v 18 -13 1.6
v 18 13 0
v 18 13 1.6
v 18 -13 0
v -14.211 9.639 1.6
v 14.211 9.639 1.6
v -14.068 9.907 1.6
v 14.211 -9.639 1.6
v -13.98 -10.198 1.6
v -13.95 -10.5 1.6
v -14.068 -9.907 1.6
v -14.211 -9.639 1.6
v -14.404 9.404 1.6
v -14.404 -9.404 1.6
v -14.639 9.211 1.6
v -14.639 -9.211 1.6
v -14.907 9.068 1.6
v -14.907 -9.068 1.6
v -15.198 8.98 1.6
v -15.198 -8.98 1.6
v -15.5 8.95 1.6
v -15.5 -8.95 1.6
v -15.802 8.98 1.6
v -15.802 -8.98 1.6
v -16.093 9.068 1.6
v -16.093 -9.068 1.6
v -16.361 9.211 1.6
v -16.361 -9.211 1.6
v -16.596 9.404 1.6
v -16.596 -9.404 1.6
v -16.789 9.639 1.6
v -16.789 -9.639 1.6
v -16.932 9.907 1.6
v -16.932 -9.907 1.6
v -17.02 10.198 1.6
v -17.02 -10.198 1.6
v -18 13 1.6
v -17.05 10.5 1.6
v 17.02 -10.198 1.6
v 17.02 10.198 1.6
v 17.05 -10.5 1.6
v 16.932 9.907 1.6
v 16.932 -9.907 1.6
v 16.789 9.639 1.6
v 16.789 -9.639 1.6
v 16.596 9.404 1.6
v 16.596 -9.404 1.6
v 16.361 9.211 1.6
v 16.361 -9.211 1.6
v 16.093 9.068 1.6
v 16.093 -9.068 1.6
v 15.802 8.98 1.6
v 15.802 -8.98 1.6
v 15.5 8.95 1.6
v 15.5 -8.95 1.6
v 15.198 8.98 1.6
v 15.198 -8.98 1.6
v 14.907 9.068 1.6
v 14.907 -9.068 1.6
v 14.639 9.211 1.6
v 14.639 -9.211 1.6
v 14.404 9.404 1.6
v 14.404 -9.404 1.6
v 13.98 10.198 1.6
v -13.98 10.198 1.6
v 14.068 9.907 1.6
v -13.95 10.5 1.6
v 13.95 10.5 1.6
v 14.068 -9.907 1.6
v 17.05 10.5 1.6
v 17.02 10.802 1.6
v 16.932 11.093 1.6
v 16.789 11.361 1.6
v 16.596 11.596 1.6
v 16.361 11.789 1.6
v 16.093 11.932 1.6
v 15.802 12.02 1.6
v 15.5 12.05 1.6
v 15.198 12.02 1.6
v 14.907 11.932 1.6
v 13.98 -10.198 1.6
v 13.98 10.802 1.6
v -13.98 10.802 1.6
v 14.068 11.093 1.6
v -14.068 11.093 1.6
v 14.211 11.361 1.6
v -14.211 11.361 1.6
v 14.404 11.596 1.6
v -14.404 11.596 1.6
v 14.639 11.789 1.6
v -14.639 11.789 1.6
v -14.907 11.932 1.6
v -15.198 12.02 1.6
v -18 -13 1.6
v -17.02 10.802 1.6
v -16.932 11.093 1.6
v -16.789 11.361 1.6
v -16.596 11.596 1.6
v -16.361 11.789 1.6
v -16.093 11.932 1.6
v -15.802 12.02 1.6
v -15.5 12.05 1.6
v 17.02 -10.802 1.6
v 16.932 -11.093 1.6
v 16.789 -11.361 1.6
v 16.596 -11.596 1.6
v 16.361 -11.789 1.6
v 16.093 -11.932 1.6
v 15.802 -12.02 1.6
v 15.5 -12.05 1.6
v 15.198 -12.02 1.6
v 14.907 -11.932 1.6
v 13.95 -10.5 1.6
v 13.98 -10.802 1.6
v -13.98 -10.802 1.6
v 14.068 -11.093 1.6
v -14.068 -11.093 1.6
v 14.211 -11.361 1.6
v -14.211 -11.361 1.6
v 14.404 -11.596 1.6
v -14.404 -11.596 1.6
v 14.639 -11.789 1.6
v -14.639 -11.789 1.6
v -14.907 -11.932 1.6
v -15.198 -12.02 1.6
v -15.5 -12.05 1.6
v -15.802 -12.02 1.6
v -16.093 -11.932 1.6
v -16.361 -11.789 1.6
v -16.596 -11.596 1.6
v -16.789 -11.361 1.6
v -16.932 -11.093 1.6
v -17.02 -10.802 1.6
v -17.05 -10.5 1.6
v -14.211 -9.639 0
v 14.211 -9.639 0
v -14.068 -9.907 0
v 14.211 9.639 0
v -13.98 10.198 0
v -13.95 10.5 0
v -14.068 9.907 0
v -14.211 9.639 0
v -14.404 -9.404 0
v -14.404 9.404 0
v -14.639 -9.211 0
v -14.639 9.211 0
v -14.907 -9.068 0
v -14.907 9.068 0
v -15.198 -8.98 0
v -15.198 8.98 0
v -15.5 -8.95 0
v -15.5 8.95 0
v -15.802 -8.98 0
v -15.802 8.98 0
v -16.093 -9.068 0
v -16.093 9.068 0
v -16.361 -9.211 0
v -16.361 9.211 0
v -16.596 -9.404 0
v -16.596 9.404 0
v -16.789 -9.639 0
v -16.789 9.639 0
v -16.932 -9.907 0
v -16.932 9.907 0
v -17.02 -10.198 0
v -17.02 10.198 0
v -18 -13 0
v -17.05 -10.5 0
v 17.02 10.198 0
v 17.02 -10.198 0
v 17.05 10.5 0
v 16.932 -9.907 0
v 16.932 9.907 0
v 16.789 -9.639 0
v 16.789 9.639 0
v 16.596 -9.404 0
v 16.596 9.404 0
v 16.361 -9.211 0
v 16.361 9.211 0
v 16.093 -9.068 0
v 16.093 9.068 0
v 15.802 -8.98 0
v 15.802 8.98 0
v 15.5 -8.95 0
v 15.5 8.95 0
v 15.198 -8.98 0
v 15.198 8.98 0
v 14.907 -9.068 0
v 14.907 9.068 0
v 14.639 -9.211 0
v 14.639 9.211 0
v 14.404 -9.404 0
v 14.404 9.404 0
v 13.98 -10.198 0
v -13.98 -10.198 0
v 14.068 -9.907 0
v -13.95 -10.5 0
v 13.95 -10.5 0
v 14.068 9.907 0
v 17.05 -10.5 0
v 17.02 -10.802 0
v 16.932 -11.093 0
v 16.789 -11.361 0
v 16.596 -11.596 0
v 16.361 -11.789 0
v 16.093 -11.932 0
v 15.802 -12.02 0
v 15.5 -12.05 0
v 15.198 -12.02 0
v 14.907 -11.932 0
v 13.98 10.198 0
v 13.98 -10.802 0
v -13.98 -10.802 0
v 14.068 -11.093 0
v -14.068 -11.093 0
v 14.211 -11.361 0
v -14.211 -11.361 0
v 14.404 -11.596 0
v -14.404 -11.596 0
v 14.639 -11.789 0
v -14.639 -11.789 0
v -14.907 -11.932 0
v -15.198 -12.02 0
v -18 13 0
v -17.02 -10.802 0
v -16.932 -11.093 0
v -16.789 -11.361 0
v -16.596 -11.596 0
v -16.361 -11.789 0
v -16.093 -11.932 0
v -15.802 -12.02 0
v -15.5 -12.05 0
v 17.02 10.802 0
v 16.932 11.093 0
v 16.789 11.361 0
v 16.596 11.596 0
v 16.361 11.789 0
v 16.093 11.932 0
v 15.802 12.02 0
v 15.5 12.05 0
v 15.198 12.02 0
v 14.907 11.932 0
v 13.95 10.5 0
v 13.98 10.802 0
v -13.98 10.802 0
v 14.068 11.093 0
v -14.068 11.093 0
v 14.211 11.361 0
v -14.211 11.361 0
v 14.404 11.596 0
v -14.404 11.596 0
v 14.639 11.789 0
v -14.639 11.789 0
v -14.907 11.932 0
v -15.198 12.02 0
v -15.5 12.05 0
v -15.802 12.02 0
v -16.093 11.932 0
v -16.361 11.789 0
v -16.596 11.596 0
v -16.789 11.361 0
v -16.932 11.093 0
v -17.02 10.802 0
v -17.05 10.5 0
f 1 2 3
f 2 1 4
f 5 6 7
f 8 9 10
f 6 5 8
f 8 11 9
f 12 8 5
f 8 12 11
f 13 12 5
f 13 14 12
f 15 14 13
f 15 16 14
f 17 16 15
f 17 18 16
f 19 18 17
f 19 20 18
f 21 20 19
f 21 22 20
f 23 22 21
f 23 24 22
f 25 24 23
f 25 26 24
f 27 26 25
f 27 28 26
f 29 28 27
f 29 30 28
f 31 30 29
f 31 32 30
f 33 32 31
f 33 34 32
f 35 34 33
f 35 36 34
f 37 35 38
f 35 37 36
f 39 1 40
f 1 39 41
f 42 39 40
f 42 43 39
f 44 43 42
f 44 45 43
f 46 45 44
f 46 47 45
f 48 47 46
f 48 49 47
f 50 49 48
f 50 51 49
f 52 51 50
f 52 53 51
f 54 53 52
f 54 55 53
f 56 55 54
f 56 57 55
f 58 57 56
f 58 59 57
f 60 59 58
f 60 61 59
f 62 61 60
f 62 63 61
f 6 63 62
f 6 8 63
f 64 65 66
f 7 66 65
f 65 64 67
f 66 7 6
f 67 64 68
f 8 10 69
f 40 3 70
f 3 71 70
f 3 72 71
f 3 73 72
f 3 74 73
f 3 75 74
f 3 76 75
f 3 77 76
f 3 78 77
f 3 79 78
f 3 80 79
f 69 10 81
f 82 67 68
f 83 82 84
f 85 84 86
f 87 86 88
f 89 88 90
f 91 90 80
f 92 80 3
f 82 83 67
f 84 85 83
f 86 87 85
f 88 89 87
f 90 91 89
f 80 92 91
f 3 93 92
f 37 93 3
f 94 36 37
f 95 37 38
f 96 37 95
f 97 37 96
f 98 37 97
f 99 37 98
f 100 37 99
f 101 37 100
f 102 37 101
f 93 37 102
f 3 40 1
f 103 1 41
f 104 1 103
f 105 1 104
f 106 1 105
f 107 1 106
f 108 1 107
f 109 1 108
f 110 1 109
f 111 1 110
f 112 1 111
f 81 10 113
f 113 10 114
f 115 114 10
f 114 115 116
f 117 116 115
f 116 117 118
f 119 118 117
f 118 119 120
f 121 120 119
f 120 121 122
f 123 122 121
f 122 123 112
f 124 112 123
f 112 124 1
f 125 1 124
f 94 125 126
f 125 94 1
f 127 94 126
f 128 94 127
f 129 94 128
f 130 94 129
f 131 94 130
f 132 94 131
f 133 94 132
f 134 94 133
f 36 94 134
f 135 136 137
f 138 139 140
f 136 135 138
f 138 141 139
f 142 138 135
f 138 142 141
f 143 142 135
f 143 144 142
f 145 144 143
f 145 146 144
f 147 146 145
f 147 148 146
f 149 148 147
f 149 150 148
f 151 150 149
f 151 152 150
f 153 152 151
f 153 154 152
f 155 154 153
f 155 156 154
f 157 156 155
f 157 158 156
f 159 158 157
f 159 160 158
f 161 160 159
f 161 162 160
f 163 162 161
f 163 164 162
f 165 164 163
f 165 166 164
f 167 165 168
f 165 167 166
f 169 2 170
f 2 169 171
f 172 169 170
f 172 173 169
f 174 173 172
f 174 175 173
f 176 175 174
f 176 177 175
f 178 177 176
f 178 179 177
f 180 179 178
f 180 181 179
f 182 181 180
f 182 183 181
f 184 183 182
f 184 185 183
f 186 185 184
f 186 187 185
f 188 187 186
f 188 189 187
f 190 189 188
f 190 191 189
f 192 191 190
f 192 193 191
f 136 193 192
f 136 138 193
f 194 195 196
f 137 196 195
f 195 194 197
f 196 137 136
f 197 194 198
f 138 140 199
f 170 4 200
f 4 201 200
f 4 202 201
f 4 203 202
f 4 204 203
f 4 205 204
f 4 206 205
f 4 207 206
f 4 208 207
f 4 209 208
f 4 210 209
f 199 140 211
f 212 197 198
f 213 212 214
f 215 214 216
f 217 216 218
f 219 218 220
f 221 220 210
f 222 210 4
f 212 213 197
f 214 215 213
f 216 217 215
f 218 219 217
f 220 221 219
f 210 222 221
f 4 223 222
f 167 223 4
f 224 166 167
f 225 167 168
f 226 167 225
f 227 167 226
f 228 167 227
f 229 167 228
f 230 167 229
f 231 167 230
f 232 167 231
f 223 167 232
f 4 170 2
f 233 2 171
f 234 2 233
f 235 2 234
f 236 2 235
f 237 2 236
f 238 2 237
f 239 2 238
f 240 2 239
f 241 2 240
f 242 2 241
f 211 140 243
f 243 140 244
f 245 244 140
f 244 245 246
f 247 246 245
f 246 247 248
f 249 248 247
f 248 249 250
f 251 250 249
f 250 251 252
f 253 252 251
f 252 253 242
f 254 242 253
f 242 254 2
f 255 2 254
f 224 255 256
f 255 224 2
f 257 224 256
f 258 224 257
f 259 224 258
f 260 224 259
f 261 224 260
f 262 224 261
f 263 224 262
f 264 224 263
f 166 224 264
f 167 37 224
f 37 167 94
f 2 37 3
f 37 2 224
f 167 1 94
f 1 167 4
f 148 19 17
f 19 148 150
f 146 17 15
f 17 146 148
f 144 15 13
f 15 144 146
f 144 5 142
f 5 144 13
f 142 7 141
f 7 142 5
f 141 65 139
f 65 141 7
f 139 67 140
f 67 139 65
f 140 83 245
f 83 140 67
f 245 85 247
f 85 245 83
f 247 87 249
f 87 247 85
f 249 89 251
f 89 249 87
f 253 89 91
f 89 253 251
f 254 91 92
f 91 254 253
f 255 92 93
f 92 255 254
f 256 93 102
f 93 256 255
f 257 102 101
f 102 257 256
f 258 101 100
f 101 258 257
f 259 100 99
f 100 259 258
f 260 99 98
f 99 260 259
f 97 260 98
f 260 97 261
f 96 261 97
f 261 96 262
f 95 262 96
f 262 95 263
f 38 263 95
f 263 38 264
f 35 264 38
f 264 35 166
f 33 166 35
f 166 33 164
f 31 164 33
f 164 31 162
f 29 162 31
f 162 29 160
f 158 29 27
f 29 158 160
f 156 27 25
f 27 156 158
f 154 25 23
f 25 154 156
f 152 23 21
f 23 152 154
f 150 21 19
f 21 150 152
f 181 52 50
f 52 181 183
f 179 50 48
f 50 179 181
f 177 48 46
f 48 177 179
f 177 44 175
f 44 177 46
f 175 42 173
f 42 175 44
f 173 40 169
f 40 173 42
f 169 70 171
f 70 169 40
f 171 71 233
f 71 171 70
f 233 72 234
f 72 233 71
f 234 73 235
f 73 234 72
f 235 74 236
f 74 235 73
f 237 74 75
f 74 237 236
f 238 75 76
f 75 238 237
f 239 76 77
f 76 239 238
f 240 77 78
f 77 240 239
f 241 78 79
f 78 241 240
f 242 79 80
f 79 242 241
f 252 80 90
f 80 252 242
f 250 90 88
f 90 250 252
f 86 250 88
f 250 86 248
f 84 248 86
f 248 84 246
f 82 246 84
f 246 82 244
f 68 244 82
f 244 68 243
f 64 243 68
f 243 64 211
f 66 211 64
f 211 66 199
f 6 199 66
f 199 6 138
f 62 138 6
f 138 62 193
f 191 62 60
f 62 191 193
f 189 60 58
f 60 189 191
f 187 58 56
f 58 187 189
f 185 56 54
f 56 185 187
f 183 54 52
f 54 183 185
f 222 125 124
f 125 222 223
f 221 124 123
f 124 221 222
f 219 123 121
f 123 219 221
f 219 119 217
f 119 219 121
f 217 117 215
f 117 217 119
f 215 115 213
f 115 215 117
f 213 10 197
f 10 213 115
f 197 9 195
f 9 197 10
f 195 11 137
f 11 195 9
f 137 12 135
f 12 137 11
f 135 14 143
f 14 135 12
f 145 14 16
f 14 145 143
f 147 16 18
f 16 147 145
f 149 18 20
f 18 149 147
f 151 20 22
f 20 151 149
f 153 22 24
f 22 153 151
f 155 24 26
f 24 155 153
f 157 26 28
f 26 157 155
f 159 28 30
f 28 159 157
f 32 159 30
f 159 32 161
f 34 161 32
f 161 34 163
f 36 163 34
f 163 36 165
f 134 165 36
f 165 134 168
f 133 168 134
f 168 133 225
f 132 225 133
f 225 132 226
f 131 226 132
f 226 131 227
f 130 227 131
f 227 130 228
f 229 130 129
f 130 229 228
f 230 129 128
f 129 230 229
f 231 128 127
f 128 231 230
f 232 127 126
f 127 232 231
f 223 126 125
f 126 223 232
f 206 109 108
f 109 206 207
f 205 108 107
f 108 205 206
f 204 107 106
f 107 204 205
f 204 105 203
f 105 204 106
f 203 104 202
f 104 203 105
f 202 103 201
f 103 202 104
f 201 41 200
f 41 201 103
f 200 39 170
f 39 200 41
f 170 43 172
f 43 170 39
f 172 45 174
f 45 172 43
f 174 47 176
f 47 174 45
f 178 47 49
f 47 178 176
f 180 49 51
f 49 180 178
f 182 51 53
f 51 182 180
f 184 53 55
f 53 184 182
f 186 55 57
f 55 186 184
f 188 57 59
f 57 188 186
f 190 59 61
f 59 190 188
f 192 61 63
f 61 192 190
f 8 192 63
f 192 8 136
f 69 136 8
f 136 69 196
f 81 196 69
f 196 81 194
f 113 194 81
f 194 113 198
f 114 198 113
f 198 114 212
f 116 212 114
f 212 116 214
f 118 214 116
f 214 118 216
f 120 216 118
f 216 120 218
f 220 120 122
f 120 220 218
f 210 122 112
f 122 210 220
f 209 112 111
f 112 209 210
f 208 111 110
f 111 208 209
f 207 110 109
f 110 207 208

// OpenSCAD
pcb_dimensions = [36, 26, 1.6];

mounting_hole_diameter = 3.1;
mounting_hole_centres = [31, 21];

module GpsBoardHoles()
{
  for(x = [-mounting_hole_centres[0] / 2, mounting_hole_centres[0] / 2])
  {
    for(y = [-mounting_hole_centres[1] / 2, mounting_hole_centres[1] / 2])
    {
      translate([x, y, 0])
      {
        circle(d=mounting_hole_diameter, $fn=32);
      }
    }
  }
}

module GpsBoard()
{
  difference()
  {
    /* PCB */
    translate([0, 0, pcb_dimensions[2] / 2])
    {
      color("green")
      {
        cube(pcb_dimensions, center=true);
      }
    }

    linear_extrude(20, center=true)
    {
      GpsBoardHoles();
    }
  }
}

GpsBoard();
